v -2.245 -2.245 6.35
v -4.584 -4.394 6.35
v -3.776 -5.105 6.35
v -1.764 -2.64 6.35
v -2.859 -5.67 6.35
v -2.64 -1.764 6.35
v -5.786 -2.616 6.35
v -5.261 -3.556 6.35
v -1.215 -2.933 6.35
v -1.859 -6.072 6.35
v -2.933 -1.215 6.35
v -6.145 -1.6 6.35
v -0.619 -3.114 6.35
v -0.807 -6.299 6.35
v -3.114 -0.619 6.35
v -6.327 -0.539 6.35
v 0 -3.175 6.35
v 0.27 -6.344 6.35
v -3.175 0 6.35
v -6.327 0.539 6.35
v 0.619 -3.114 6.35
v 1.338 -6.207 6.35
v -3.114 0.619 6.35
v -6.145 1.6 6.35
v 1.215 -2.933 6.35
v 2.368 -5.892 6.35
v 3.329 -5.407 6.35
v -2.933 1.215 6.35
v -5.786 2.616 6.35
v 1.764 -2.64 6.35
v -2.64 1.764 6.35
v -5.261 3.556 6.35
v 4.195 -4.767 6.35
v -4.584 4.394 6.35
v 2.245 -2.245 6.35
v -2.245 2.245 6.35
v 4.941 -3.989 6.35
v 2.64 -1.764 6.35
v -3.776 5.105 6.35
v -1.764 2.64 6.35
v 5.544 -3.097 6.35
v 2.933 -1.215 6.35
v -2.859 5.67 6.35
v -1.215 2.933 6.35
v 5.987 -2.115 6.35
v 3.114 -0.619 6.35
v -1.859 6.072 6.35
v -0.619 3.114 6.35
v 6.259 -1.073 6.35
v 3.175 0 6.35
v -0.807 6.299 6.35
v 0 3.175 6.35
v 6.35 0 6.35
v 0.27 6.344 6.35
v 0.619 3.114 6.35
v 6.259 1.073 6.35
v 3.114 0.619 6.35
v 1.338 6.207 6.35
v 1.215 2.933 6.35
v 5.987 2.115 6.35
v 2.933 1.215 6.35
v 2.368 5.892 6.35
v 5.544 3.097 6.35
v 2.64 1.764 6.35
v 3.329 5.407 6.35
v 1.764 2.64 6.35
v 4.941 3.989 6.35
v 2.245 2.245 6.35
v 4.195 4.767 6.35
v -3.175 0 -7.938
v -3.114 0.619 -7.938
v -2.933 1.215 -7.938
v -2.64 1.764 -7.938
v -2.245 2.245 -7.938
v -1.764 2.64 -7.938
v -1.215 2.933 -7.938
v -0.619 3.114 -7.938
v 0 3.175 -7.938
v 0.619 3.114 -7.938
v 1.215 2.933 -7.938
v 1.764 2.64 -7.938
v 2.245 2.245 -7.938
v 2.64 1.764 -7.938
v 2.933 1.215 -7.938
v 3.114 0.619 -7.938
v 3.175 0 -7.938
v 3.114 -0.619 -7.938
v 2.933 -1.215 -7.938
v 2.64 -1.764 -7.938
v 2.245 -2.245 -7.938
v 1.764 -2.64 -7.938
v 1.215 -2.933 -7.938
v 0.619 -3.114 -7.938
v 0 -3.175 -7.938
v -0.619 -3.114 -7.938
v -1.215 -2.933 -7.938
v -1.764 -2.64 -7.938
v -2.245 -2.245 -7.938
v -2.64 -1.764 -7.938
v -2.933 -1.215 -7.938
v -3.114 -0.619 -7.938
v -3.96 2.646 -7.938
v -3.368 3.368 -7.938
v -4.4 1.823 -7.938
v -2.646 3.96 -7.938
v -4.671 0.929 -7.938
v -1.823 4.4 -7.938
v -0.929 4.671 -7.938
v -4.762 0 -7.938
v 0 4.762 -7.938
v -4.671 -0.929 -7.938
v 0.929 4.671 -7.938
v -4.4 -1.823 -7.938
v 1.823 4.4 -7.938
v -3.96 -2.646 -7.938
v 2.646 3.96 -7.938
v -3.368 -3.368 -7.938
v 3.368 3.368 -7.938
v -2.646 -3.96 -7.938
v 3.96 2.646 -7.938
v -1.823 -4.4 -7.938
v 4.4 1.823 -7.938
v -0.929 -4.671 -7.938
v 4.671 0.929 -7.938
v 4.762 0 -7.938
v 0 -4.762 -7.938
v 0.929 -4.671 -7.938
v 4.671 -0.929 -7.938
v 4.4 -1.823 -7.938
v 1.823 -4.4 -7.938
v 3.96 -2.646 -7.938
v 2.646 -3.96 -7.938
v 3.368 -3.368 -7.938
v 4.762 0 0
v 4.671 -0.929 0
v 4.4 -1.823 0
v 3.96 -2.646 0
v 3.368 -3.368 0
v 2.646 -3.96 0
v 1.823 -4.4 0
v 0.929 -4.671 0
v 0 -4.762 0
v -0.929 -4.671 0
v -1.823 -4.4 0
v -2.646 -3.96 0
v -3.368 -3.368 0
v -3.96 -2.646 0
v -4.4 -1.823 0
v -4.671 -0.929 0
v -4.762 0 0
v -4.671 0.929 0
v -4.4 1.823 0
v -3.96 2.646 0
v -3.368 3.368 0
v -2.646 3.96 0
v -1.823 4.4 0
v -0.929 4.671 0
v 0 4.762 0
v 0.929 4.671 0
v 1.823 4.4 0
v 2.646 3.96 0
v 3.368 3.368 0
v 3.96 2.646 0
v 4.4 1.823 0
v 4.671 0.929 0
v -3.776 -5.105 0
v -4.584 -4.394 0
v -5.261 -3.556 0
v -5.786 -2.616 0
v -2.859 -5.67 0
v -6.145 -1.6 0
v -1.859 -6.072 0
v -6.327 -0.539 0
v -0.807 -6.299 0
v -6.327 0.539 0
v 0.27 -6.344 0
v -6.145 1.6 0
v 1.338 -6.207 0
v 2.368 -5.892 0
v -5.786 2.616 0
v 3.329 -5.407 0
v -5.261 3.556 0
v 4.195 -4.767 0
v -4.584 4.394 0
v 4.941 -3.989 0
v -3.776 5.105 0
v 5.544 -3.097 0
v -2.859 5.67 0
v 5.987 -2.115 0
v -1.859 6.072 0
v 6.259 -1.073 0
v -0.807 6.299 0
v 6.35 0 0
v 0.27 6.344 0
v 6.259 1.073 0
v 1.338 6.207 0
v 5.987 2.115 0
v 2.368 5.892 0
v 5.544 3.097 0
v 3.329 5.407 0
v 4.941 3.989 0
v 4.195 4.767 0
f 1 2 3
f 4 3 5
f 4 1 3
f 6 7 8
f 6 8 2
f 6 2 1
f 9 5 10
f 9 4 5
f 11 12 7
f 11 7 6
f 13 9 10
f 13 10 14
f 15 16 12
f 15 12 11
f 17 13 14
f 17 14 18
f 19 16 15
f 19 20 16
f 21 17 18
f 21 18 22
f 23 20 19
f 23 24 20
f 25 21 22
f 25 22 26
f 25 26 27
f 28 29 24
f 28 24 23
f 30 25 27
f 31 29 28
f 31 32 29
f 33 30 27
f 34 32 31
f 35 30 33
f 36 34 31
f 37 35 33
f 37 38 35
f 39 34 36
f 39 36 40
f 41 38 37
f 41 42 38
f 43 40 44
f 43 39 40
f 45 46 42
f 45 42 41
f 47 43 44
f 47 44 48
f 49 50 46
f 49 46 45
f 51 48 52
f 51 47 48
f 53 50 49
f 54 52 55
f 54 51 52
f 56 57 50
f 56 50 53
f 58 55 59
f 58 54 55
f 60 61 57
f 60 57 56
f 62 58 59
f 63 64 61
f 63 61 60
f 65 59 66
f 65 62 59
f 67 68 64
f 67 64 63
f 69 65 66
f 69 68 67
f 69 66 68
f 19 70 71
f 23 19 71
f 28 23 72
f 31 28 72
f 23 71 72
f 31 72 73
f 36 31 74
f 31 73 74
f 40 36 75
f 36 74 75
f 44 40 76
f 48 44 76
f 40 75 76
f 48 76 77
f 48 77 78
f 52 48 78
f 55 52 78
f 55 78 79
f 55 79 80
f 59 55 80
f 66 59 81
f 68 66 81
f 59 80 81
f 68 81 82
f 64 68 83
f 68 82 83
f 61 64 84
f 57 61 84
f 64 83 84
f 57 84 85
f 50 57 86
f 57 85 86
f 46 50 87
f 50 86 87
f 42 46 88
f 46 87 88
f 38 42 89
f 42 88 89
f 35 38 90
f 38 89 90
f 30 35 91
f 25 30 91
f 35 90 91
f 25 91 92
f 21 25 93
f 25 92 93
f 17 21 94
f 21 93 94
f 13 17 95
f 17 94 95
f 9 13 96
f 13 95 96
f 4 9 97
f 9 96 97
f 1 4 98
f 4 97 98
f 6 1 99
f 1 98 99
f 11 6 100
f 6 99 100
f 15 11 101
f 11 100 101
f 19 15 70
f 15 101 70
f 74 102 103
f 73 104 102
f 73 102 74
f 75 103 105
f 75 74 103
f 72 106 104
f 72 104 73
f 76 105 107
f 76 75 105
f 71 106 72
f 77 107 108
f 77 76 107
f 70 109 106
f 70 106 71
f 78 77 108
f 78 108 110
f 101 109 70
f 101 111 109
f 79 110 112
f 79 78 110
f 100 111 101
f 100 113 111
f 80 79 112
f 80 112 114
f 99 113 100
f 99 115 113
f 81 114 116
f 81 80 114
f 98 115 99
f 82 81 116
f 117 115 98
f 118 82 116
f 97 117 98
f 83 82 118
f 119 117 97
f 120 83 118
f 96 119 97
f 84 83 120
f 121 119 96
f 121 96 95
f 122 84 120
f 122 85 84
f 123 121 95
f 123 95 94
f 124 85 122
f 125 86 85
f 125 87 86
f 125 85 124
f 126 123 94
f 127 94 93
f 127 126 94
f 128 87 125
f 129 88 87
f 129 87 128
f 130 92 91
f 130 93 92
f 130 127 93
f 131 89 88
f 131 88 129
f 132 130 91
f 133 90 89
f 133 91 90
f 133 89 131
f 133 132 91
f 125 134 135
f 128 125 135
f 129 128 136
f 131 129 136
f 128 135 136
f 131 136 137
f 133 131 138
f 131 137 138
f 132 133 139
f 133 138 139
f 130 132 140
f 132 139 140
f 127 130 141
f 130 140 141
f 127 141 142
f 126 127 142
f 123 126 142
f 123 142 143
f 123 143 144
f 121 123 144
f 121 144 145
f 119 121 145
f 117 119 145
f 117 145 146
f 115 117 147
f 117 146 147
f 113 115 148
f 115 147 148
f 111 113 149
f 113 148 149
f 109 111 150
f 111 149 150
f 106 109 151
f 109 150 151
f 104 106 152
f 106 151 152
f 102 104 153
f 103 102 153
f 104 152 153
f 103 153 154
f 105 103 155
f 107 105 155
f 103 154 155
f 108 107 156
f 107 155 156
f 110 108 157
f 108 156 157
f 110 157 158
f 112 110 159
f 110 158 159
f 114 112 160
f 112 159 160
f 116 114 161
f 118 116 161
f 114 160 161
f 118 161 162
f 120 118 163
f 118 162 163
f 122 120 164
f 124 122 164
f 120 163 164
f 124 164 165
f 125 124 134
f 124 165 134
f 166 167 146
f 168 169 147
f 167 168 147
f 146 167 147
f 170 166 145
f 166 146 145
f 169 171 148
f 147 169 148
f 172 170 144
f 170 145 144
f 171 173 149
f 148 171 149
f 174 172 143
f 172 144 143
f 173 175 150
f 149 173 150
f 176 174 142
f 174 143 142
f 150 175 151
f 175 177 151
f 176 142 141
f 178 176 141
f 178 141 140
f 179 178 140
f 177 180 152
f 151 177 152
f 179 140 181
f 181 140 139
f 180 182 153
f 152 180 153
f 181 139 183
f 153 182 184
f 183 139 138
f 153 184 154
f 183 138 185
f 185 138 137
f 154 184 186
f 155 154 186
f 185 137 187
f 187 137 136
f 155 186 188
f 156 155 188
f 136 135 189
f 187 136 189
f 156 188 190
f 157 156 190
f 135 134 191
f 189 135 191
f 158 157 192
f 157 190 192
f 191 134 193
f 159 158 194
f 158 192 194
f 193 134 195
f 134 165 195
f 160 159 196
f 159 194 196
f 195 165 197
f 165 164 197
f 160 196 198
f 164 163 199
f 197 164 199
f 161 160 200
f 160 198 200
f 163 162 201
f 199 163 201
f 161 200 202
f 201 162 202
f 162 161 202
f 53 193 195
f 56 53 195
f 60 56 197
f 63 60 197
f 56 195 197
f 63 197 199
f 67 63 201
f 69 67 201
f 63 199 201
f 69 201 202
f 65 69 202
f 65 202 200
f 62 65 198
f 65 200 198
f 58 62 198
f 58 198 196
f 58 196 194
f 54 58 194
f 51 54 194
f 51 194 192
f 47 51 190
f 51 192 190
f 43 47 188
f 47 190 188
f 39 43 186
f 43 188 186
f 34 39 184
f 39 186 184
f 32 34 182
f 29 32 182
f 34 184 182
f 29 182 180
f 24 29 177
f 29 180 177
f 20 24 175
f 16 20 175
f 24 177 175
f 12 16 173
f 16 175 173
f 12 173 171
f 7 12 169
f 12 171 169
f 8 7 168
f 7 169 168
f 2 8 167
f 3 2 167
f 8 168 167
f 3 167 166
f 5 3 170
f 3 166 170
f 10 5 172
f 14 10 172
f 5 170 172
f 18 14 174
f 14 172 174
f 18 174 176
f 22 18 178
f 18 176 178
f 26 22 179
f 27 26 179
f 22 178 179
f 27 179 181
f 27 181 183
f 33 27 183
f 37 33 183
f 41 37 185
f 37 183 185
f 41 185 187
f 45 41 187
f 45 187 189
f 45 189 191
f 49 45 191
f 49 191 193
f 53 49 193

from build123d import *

# Parameters (mm, degrees)
SKETCH1_R           = 6.35
BOSS_EXTRUDE1_DEPTH = 6.35
SKETCH2_R           = 4.7625
BOSS_EXTRUDE2_DEPTH = 7.9375
SKETCH3_R           = 3.175
CUT_EXTRUDE1_DEPTH  = 14.2875


with BuildPart() as part:
    # Sketch1 → Boss-Extrude1 (new body)
    with BuildSketch(Plane.XY):
        Circle(SKETCH1_R)
    extrude(amount=BOSS_EXTRUDE1_DEPTH)

    # Sketch2 → Boss-Extrude2 (add)
    with BuildSketch(Plane(origin=(0, 0, 0), x_dir=(-1, 0, 0), z_dir=(0, 0, -1))):
        with Locations(Location((0, 0, 0), (0, 0, 180))):
            Circle(SKETCH2_R)
    extrude(amount=BOSS_EXTRUDE2_DEPTH)

    # Sketch3 → Cut-Extrude1 (cut)
    with BuildSketch(Plane(origin=(0, 0, -7.9375), x_dir=(-1, 0, 0), z_dir=(0, 0, -1))):
        Circle(SKETCH3_R)
    extrude(amount=-CUT_EXTRUDE1_DEPTH, mode=Mode.SUBTRACT)


solid = part.part
